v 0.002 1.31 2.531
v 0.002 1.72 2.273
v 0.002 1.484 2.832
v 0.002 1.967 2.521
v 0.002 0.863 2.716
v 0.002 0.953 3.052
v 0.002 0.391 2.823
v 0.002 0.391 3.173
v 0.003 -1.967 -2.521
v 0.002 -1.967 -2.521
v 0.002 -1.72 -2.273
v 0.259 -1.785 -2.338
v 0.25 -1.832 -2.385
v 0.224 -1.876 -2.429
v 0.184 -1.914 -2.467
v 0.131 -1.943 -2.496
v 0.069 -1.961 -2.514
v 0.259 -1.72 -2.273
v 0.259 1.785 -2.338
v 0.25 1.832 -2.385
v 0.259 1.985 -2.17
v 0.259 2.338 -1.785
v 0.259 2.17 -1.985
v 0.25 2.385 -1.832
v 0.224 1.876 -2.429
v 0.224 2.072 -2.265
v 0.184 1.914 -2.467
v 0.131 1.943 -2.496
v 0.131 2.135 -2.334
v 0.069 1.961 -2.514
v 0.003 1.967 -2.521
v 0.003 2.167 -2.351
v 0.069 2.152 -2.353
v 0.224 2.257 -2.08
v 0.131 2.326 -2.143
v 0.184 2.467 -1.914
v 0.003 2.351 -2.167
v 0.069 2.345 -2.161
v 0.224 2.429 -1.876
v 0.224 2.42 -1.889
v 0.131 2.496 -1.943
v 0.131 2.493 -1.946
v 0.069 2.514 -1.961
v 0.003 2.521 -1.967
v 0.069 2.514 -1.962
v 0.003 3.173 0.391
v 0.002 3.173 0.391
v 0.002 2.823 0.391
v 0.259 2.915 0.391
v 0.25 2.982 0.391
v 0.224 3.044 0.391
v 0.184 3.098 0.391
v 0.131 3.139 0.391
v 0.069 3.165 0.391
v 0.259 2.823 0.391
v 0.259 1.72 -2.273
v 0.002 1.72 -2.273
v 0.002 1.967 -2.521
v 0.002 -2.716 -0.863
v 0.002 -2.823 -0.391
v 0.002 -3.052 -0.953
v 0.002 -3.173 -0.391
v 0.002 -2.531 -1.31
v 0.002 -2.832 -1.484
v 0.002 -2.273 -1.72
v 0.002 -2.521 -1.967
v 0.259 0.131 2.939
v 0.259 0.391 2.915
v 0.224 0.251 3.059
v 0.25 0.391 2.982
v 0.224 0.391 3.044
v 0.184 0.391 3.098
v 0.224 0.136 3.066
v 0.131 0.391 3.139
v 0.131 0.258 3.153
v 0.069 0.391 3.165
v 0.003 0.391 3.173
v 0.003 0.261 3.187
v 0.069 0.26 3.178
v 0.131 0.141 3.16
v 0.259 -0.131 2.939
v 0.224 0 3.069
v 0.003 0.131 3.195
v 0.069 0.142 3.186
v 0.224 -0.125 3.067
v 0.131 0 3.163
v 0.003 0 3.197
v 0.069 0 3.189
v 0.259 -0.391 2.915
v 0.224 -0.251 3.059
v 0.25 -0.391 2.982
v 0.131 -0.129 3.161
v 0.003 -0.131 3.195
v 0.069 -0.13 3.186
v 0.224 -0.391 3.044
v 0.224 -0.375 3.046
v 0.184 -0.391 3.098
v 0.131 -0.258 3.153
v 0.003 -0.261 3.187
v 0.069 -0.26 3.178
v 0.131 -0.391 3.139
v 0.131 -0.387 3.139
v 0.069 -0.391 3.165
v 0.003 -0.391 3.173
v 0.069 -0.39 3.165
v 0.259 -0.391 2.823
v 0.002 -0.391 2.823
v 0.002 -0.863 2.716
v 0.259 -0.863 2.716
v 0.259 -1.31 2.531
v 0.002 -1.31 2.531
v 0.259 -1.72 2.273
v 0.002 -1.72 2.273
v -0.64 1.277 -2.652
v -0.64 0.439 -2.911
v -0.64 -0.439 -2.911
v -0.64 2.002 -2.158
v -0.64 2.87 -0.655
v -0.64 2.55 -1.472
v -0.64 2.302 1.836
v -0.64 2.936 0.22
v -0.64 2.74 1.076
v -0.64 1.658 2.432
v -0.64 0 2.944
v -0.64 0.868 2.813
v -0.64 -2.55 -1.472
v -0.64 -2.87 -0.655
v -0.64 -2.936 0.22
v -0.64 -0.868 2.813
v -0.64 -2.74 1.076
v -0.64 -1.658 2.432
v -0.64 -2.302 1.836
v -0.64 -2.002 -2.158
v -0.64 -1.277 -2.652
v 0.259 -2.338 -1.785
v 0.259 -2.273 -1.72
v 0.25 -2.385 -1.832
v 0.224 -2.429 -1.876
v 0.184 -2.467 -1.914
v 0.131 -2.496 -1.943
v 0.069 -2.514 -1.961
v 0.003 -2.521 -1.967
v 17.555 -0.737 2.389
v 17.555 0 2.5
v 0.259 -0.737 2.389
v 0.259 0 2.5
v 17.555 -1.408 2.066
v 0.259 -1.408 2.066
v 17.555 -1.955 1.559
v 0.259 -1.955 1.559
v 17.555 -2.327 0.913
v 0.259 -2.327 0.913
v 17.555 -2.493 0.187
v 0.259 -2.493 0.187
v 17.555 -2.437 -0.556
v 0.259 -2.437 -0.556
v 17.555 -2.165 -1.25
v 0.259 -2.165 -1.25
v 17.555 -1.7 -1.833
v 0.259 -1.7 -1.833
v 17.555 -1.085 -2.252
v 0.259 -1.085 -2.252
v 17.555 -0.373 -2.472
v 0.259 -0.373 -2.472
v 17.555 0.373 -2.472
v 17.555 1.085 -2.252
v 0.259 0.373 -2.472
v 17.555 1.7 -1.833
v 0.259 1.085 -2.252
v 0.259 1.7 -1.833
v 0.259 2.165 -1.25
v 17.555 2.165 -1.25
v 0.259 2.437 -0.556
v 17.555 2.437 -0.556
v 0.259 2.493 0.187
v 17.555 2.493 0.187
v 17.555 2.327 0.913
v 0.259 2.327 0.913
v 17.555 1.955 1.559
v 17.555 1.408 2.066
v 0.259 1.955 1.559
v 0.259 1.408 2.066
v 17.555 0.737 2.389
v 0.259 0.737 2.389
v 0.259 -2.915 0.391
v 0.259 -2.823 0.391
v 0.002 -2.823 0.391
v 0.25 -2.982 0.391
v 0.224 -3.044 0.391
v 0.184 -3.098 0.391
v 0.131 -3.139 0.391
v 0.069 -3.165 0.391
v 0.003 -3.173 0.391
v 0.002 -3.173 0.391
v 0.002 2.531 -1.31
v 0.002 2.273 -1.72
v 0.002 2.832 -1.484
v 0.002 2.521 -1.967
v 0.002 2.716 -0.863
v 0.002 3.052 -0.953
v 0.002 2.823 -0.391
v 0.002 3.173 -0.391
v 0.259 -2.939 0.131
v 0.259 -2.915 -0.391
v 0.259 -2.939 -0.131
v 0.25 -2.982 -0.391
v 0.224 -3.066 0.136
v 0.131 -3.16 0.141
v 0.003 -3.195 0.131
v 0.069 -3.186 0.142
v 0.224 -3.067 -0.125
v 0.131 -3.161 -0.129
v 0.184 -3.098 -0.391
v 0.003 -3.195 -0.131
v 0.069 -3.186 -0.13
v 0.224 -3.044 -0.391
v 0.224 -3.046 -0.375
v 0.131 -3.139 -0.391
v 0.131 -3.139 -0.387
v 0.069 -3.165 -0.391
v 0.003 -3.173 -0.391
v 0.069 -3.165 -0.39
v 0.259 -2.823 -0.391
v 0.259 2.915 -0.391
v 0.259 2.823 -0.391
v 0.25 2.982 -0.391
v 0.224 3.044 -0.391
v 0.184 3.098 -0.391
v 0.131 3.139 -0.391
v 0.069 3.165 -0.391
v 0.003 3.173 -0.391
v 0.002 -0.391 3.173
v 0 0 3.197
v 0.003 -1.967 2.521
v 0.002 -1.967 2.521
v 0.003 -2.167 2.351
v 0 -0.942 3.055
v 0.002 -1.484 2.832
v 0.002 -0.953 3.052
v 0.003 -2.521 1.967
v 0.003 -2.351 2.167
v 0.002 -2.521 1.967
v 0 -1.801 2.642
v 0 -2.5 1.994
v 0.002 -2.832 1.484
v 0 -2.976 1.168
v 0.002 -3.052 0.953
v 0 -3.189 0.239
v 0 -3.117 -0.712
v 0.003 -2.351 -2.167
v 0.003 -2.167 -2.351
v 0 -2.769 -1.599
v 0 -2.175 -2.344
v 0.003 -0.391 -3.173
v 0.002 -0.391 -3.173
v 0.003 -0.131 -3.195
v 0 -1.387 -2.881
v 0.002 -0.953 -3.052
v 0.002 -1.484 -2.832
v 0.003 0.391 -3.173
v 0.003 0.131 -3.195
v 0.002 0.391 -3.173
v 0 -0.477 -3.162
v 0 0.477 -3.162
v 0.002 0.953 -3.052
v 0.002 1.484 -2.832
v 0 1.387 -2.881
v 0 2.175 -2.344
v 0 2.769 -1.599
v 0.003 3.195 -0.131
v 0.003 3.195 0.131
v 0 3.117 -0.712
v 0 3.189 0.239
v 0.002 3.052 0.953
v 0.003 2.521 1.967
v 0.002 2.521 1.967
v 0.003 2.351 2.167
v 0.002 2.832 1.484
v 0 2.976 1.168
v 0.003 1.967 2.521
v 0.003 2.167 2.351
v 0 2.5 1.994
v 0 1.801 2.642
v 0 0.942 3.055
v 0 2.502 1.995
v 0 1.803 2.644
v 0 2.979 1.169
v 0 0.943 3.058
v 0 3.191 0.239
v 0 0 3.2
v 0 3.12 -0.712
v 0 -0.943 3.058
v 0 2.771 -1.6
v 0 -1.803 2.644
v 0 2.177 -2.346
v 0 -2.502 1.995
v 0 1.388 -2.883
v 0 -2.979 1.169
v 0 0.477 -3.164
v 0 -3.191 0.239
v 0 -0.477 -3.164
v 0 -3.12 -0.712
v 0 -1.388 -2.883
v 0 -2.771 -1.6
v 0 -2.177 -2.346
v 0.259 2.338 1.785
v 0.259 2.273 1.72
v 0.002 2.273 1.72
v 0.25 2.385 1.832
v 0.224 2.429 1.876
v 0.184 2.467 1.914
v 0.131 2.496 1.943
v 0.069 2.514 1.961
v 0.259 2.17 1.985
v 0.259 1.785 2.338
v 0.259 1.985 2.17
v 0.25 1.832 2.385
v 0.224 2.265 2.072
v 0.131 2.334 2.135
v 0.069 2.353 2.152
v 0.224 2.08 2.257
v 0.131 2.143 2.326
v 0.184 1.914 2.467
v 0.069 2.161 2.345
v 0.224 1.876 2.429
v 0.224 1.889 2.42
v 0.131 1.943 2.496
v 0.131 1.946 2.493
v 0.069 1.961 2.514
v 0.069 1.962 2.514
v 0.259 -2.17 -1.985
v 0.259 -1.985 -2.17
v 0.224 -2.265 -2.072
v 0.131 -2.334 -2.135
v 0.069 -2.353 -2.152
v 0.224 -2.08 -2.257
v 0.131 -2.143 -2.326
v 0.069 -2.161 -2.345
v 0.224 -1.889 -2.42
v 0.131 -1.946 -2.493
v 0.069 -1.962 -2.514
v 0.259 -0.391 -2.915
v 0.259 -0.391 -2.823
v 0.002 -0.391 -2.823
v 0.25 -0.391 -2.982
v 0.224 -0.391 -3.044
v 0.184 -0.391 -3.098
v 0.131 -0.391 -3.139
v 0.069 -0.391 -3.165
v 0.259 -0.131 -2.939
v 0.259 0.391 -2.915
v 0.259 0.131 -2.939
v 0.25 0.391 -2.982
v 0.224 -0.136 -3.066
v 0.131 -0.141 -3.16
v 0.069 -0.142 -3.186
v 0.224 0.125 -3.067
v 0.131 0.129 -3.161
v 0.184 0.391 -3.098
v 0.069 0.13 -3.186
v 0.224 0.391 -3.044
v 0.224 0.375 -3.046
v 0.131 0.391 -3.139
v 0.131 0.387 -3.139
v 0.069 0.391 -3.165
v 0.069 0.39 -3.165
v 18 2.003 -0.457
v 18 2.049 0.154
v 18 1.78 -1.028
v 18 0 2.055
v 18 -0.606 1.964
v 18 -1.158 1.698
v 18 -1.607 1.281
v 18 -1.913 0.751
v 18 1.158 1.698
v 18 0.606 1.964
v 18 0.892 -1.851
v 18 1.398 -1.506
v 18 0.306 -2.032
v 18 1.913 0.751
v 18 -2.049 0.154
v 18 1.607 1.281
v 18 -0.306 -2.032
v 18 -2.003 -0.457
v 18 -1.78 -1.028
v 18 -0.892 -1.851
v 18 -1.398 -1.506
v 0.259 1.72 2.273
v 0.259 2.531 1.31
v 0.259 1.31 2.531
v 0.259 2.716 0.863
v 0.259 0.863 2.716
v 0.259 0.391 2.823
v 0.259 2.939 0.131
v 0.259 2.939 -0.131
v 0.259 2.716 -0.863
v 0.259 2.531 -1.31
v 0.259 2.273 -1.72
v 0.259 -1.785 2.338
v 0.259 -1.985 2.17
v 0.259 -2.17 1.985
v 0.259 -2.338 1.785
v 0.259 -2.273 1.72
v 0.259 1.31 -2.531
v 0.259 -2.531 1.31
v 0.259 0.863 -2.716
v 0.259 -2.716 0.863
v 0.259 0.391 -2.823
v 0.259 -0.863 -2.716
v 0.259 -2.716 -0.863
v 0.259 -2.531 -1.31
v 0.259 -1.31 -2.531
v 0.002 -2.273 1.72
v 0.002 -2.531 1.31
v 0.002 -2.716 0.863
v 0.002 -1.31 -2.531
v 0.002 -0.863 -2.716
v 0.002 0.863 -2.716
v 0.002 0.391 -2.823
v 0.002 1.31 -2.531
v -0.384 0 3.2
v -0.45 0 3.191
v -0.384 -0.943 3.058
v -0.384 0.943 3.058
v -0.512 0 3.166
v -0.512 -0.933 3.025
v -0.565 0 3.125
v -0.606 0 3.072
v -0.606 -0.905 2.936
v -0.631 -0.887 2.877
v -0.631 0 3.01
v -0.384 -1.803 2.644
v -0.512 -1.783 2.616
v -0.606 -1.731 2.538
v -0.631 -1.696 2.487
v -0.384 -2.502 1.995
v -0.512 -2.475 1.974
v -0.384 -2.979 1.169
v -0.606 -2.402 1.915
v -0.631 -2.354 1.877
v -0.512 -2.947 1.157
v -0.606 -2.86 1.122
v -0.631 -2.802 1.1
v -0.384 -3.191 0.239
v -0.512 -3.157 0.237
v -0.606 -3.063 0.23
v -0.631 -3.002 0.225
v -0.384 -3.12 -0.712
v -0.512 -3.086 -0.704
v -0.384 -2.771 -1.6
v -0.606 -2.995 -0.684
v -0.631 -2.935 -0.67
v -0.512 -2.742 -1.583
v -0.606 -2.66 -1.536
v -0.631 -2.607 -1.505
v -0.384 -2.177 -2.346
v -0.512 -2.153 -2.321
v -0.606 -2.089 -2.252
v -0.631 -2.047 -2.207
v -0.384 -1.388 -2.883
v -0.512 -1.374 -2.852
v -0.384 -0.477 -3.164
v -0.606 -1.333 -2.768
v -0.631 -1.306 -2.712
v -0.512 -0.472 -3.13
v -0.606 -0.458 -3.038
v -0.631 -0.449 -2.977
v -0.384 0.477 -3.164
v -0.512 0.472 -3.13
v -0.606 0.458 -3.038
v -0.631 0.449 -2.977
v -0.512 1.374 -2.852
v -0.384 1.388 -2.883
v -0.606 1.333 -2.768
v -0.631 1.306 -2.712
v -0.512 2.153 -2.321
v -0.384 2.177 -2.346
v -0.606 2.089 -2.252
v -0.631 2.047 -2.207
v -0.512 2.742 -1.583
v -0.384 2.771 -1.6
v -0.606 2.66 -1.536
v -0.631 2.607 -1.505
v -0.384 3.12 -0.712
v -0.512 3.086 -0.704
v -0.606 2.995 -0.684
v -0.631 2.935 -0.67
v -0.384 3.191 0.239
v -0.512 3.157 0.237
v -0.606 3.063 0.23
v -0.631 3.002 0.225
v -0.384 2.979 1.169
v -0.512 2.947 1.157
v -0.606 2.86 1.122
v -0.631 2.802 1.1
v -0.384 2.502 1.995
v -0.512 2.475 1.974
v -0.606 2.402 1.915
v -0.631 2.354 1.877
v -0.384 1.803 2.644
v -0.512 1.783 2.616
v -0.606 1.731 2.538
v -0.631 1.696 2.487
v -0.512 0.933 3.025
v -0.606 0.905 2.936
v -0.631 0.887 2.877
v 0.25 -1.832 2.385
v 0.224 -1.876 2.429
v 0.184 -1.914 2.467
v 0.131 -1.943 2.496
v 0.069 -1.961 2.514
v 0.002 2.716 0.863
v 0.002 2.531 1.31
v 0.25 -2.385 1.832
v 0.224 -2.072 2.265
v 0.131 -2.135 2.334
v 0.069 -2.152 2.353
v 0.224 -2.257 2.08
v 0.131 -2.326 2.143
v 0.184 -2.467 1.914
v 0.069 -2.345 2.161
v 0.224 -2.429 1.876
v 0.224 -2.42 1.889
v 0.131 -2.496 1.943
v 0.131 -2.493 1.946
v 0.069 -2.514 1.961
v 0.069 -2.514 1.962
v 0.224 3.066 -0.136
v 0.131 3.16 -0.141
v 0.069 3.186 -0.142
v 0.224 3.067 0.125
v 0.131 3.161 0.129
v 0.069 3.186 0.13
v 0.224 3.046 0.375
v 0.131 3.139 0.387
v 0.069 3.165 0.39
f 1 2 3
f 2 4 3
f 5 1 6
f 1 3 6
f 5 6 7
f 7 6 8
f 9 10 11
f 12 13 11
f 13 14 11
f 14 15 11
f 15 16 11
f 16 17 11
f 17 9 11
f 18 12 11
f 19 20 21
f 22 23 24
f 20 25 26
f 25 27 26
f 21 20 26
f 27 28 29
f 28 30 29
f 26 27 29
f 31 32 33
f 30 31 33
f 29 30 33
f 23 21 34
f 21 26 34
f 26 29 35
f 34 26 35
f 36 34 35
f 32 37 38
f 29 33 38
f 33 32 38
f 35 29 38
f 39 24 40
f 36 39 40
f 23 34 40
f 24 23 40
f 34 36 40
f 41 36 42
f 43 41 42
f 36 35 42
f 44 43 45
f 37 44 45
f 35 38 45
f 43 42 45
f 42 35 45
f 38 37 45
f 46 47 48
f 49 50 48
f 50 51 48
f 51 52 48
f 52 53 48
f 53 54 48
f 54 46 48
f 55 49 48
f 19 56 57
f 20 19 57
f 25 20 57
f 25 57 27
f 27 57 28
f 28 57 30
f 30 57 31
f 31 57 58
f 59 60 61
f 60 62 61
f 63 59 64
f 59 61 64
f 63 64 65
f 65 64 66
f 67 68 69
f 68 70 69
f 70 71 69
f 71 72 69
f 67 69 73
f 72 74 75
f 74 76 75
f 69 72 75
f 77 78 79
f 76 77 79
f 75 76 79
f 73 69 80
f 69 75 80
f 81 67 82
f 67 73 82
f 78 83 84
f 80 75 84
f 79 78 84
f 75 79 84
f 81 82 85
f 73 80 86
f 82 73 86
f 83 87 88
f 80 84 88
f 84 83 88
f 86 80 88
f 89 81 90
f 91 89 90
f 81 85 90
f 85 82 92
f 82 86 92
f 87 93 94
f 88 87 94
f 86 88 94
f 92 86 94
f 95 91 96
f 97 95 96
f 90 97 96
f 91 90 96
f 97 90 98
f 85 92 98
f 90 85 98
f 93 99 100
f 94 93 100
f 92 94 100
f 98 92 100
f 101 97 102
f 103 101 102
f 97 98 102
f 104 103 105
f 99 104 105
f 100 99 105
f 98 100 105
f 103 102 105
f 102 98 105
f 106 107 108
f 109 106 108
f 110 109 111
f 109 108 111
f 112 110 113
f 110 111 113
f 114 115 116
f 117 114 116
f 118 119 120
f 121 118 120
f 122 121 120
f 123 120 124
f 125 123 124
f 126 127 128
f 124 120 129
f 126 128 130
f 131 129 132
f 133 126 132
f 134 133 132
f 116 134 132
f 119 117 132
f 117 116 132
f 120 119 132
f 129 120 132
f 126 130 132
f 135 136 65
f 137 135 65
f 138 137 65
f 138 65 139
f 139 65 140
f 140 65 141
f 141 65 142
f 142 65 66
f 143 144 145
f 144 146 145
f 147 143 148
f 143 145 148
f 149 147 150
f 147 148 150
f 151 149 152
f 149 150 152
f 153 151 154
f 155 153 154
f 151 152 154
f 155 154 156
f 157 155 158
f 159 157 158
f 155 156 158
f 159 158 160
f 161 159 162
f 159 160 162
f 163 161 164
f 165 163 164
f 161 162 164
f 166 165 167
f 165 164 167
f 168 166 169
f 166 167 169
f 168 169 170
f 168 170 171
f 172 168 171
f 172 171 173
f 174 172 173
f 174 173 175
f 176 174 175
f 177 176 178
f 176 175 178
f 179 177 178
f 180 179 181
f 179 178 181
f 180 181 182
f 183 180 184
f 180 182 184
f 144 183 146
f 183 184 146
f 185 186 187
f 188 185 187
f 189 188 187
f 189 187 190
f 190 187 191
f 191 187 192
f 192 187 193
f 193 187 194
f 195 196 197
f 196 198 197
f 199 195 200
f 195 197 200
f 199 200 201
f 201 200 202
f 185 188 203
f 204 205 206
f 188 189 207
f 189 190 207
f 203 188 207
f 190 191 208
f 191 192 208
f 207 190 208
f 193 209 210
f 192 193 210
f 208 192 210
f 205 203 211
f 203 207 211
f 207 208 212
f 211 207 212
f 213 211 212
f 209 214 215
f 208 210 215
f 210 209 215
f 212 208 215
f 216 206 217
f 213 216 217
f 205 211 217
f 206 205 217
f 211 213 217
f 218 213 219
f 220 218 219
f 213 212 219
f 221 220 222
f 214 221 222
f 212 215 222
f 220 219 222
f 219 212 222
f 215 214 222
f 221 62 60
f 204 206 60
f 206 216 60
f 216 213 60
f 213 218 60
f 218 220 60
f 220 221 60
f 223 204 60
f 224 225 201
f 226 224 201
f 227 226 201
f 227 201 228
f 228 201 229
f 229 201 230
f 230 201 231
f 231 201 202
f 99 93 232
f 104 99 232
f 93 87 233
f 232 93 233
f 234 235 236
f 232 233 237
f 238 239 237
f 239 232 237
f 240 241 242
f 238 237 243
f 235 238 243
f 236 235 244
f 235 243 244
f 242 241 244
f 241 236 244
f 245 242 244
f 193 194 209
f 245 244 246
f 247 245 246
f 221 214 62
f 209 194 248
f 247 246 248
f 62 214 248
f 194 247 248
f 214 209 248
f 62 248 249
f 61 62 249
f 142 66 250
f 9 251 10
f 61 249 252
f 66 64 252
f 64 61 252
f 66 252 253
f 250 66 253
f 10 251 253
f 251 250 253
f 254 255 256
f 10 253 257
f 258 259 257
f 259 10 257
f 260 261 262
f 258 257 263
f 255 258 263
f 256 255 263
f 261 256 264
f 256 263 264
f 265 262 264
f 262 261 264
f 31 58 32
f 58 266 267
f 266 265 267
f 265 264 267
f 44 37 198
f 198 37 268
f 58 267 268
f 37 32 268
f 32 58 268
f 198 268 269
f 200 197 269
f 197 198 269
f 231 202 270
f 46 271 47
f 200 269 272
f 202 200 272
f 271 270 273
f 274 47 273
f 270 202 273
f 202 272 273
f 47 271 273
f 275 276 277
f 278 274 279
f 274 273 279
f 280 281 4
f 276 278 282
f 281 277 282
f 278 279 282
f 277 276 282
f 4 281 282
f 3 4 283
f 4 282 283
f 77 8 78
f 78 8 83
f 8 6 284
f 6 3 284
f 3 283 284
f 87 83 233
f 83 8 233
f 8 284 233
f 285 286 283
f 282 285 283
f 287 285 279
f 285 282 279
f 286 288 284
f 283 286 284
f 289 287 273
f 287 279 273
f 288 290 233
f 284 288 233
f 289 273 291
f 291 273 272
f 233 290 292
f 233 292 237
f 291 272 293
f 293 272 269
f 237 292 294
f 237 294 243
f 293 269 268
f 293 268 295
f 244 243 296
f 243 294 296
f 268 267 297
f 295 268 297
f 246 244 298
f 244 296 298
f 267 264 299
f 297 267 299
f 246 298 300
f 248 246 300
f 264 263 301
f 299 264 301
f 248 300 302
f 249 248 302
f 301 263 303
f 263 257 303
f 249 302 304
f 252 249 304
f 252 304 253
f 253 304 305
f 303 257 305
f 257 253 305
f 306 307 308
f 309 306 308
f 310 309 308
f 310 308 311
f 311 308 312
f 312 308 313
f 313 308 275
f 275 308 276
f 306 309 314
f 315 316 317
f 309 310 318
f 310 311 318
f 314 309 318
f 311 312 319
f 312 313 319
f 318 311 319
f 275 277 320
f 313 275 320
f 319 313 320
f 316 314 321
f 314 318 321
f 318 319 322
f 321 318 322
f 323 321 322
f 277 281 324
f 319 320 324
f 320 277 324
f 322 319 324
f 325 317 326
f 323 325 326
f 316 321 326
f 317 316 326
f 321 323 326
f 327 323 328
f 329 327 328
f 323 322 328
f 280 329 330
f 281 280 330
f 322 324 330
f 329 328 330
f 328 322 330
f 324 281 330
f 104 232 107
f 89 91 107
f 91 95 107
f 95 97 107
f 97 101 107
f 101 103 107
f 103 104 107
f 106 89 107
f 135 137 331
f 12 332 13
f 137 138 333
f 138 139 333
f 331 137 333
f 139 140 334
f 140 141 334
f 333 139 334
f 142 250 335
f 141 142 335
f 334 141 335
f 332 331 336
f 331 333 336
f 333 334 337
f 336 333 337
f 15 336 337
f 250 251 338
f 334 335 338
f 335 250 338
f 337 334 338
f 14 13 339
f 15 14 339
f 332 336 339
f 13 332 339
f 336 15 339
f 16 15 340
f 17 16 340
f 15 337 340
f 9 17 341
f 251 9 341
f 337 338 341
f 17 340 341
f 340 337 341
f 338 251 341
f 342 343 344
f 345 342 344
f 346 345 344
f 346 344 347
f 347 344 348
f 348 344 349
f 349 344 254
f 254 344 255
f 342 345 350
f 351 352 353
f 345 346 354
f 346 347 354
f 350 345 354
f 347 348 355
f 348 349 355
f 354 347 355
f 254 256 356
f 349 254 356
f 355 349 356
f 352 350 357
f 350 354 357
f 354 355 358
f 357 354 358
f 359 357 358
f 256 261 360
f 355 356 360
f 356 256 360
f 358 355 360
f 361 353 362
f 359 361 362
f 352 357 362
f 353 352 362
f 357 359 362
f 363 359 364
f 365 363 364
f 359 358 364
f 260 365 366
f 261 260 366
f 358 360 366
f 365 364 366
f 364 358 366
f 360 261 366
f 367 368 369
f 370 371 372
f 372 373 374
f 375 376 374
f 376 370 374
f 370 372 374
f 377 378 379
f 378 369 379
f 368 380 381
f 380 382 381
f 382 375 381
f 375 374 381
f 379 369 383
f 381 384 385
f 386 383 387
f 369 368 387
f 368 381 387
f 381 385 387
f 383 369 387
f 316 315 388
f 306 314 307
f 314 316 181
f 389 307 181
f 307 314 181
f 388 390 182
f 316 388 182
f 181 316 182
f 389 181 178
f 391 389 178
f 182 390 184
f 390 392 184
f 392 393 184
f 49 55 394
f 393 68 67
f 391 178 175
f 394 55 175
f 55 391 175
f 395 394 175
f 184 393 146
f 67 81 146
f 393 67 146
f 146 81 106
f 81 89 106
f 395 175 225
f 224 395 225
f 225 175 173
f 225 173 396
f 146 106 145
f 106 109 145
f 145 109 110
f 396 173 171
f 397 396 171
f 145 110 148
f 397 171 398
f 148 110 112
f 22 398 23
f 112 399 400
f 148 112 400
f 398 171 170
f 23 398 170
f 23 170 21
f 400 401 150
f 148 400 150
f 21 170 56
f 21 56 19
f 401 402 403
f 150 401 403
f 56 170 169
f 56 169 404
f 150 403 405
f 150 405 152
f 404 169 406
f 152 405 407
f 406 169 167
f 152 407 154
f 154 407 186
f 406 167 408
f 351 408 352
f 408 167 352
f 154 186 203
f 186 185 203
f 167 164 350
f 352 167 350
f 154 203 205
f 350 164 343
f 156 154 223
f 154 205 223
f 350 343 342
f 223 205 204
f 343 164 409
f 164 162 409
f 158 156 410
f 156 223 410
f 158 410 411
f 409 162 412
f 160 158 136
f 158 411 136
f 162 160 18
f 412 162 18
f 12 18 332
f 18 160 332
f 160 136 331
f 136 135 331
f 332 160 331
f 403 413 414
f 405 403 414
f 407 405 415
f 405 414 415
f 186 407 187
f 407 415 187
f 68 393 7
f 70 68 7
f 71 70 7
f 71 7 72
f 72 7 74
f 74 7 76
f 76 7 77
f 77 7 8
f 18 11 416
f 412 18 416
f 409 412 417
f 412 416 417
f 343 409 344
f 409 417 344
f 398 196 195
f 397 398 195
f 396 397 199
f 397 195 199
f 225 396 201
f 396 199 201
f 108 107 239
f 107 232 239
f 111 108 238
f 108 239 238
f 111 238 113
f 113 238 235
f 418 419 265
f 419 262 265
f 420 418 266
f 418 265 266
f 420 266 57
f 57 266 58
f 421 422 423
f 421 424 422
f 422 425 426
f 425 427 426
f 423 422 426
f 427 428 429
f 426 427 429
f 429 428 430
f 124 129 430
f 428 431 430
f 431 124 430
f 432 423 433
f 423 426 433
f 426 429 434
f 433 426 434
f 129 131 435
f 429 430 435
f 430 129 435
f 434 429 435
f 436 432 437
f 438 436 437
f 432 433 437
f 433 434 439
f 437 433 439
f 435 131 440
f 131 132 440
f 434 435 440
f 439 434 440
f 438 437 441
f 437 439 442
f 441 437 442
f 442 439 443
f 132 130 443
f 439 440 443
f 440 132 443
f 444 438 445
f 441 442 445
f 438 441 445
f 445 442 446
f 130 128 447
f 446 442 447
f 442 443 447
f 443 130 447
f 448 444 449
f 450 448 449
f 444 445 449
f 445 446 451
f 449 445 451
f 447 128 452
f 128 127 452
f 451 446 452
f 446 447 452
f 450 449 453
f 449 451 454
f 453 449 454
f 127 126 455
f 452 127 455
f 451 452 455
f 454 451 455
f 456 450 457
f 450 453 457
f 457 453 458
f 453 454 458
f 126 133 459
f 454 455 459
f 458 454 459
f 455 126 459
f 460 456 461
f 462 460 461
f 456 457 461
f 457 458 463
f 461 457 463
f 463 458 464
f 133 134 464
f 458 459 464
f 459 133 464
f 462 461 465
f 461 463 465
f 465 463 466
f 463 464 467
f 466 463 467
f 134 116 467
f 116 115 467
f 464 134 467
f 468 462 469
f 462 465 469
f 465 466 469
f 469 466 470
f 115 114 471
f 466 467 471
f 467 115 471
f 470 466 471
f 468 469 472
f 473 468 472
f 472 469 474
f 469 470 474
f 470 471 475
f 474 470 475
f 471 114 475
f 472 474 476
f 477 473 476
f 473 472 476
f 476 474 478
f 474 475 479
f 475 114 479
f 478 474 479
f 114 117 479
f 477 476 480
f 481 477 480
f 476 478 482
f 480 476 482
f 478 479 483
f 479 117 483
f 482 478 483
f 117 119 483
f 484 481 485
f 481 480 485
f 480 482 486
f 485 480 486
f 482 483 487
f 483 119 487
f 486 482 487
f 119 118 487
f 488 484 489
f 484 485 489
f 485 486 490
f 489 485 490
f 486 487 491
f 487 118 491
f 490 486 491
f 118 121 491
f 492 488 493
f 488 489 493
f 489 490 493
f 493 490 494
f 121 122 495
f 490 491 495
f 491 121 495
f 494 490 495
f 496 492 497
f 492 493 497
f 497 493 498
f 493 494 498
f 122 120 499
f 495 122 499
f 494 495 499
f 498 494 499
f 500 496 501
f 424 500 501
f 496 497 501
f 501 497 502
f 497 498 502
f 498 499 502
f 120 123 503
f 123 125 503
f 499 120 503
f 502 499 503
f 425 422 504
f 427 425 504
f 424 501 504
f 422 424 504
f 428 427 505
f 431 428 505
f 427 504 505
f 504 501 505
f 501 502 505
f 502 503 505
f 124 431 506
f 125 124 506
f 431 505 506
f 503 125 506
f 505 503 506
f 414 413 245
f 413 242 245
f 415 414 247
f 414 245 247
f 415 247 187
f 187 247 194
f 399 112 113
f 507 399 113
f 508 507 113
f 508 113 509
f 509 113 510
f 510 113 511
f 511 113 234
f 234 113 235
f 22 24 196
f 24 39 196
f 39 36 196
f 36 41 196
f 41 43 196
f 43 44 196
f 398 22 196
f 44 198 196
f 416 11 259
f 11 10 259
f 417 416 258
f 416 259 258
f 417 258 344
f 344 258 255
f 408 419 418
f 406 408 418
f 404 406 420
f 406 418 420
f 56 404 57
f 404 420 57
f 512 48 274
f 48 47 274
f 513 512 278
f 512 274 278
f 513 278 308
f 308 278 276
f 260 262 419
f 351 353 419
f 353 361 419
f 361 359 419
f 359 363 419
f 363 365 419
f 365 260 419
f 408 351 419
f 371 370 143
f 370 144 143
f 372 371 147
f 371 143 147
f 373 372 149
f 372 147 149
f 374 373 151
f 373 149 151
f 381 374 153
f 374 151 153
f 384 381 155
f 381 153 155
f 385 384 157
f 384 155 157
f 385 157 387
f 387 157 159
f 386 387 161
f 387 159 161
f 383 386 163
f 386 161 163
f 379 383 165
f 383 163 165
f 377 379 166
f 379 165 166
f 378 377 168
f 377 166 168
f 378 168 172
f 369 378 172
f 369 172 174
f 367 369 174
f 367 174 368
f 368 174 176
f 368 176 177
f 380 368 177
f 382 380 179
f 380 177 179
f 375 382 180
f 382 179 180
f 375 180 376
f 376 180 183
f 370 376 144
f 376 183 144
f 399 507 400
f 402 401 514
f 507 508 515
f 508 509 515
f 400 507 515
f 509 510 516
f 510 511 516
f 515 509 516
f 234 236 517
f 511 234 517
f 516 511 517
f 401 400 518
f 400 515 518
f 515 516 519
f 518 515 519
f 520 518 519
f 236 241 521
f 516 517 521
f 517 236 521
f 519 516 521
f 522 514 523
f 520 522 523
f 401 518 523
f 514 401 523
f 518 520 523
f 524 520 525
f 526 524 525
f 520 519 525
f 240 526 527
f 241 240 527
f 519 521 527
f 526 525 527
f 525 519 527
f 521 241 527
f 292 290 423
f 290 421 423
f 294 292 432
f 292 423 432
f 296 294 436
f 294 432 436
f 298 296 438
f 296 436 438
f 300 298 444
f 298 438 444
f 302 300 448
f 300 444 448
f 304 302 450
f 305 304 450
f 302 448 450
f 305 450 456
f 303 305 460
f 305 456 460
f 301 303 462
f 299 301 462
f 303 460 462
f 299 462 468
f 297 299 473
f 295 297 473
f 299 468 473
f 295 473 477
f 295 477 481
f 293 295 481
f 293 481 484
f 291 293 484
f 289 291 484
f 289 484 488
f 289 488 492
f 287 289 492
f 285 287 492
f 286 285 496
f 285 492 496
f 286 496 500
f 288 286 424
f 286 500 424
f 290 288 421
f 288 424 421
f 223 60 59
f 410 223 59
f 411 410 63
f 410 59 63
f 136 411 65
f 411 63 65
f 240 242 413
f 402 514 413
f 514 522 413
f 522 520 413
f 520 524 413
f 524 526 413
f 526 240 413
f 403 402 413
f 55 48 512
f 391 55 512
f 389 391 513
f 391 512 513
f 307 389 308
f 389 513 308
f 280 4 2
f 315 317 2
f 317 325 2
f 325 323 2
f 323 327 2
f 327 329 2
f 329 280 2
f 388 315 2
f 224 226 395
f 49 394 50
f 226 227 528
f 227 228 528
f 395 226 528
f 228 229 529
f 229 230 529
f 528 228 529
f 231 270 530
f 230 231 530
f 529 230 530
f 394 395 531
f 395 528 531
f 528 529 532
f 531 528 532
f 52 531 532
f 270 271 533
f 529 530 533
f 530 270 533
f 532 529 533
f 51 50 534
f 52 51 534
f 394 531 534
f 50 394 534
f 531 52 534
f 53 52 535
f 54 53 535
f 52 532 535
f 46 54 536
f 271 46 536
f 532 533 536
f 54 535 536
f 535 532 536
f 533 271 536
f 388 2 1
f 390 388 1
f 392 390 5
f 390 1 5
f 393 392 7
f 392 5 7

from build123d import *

# Parameters (mm, degrees)
RIBCUT_START     = -0.2561
RIBCUT_DEPTH     = 0.2561
RIBCUTSPAT_COUNT = 8
RIBCUTSPAT_ANGLE = 315


with BuildPart() as part:
    # BodySke → BaseBody (revolve)
    with BuildSketch(Plane.XY, mode=Mode.PRIVATE) as basebody_sk:
        with BuildLine():
            Line((-0.64, 2.944), (-0.64, 0))
            Line((-0.64, 0), (18, 0))
            Line((18, 0), (18, 2.055))
            Line((18, 2.055), (17.555, 2.5))
            Line((17.555, 2.5), (0.25854, 2.5))
            Line((0.25854, 2.5), (0.25854, 2.94146))
            ThreePointArc((0.25854, 2.94146), (0.183559336, 3.122479336), (0.00254, 3.19746))
            Line((0.00254, 3.19746), (0, 3.19746))
            Line((0, 3.19746), (0, 3.2))
            Line((0, 3.2), (-0.384, 3.2))
            ThreePointArc((-0.384, 3.2), (-0.565019336, 3.125019336), (-0.64, 2.944))
        make_face()
    revolve(basebody_sk.sketch.rotate(Axis((0, 0, 0), (1, 0, 0)), 90), axis=Axis((0, 0, 0), (1, 0, 0)))

    # RibCutSke → RibCut (cut)
    with BuildSketch(Plane(origin=(0.25854, 1.794401132, -0.090952894), x_dir=(0, 0, -1), z_dir=(1, 0, 0)).offset(RIBCUT_START)):
        with BuildLine():
            Line((0.300133268, 1.028638296), (0.300133268, 1.381610771))
            ThreePointArc((0.300133268, 1.381610771), (1.133634089, 1.162013372), (1.878286983, 0.7279181))
            Line((1.878286983, 0.7279181), (1.628697752, 0.478328869))
            ThreePointArc((1.628697752, 0.478328869), (0.999694888, 0.838655535), (0.300133268, 1.028638296))
        make_face()
    ribcut = extrude(amount=RIBCUT_DEPTH, mode=Mode.SUBTRACT)

    # RibCutsPat: RibCut ×8 about axis
    ribcutspat_axis = Axis((0, 0, 0), (1, 0, 0))
    for i in range(1, RIBCUTSPAT_COUNT):
        add(ribcut.rotate(ribcutspat_axis, i * RIBCUTSPAT_ANGLE / (RIBCUTSPAT_COUNT - 1)), mode=Mode.SUBTRACT)


solid = part.part
